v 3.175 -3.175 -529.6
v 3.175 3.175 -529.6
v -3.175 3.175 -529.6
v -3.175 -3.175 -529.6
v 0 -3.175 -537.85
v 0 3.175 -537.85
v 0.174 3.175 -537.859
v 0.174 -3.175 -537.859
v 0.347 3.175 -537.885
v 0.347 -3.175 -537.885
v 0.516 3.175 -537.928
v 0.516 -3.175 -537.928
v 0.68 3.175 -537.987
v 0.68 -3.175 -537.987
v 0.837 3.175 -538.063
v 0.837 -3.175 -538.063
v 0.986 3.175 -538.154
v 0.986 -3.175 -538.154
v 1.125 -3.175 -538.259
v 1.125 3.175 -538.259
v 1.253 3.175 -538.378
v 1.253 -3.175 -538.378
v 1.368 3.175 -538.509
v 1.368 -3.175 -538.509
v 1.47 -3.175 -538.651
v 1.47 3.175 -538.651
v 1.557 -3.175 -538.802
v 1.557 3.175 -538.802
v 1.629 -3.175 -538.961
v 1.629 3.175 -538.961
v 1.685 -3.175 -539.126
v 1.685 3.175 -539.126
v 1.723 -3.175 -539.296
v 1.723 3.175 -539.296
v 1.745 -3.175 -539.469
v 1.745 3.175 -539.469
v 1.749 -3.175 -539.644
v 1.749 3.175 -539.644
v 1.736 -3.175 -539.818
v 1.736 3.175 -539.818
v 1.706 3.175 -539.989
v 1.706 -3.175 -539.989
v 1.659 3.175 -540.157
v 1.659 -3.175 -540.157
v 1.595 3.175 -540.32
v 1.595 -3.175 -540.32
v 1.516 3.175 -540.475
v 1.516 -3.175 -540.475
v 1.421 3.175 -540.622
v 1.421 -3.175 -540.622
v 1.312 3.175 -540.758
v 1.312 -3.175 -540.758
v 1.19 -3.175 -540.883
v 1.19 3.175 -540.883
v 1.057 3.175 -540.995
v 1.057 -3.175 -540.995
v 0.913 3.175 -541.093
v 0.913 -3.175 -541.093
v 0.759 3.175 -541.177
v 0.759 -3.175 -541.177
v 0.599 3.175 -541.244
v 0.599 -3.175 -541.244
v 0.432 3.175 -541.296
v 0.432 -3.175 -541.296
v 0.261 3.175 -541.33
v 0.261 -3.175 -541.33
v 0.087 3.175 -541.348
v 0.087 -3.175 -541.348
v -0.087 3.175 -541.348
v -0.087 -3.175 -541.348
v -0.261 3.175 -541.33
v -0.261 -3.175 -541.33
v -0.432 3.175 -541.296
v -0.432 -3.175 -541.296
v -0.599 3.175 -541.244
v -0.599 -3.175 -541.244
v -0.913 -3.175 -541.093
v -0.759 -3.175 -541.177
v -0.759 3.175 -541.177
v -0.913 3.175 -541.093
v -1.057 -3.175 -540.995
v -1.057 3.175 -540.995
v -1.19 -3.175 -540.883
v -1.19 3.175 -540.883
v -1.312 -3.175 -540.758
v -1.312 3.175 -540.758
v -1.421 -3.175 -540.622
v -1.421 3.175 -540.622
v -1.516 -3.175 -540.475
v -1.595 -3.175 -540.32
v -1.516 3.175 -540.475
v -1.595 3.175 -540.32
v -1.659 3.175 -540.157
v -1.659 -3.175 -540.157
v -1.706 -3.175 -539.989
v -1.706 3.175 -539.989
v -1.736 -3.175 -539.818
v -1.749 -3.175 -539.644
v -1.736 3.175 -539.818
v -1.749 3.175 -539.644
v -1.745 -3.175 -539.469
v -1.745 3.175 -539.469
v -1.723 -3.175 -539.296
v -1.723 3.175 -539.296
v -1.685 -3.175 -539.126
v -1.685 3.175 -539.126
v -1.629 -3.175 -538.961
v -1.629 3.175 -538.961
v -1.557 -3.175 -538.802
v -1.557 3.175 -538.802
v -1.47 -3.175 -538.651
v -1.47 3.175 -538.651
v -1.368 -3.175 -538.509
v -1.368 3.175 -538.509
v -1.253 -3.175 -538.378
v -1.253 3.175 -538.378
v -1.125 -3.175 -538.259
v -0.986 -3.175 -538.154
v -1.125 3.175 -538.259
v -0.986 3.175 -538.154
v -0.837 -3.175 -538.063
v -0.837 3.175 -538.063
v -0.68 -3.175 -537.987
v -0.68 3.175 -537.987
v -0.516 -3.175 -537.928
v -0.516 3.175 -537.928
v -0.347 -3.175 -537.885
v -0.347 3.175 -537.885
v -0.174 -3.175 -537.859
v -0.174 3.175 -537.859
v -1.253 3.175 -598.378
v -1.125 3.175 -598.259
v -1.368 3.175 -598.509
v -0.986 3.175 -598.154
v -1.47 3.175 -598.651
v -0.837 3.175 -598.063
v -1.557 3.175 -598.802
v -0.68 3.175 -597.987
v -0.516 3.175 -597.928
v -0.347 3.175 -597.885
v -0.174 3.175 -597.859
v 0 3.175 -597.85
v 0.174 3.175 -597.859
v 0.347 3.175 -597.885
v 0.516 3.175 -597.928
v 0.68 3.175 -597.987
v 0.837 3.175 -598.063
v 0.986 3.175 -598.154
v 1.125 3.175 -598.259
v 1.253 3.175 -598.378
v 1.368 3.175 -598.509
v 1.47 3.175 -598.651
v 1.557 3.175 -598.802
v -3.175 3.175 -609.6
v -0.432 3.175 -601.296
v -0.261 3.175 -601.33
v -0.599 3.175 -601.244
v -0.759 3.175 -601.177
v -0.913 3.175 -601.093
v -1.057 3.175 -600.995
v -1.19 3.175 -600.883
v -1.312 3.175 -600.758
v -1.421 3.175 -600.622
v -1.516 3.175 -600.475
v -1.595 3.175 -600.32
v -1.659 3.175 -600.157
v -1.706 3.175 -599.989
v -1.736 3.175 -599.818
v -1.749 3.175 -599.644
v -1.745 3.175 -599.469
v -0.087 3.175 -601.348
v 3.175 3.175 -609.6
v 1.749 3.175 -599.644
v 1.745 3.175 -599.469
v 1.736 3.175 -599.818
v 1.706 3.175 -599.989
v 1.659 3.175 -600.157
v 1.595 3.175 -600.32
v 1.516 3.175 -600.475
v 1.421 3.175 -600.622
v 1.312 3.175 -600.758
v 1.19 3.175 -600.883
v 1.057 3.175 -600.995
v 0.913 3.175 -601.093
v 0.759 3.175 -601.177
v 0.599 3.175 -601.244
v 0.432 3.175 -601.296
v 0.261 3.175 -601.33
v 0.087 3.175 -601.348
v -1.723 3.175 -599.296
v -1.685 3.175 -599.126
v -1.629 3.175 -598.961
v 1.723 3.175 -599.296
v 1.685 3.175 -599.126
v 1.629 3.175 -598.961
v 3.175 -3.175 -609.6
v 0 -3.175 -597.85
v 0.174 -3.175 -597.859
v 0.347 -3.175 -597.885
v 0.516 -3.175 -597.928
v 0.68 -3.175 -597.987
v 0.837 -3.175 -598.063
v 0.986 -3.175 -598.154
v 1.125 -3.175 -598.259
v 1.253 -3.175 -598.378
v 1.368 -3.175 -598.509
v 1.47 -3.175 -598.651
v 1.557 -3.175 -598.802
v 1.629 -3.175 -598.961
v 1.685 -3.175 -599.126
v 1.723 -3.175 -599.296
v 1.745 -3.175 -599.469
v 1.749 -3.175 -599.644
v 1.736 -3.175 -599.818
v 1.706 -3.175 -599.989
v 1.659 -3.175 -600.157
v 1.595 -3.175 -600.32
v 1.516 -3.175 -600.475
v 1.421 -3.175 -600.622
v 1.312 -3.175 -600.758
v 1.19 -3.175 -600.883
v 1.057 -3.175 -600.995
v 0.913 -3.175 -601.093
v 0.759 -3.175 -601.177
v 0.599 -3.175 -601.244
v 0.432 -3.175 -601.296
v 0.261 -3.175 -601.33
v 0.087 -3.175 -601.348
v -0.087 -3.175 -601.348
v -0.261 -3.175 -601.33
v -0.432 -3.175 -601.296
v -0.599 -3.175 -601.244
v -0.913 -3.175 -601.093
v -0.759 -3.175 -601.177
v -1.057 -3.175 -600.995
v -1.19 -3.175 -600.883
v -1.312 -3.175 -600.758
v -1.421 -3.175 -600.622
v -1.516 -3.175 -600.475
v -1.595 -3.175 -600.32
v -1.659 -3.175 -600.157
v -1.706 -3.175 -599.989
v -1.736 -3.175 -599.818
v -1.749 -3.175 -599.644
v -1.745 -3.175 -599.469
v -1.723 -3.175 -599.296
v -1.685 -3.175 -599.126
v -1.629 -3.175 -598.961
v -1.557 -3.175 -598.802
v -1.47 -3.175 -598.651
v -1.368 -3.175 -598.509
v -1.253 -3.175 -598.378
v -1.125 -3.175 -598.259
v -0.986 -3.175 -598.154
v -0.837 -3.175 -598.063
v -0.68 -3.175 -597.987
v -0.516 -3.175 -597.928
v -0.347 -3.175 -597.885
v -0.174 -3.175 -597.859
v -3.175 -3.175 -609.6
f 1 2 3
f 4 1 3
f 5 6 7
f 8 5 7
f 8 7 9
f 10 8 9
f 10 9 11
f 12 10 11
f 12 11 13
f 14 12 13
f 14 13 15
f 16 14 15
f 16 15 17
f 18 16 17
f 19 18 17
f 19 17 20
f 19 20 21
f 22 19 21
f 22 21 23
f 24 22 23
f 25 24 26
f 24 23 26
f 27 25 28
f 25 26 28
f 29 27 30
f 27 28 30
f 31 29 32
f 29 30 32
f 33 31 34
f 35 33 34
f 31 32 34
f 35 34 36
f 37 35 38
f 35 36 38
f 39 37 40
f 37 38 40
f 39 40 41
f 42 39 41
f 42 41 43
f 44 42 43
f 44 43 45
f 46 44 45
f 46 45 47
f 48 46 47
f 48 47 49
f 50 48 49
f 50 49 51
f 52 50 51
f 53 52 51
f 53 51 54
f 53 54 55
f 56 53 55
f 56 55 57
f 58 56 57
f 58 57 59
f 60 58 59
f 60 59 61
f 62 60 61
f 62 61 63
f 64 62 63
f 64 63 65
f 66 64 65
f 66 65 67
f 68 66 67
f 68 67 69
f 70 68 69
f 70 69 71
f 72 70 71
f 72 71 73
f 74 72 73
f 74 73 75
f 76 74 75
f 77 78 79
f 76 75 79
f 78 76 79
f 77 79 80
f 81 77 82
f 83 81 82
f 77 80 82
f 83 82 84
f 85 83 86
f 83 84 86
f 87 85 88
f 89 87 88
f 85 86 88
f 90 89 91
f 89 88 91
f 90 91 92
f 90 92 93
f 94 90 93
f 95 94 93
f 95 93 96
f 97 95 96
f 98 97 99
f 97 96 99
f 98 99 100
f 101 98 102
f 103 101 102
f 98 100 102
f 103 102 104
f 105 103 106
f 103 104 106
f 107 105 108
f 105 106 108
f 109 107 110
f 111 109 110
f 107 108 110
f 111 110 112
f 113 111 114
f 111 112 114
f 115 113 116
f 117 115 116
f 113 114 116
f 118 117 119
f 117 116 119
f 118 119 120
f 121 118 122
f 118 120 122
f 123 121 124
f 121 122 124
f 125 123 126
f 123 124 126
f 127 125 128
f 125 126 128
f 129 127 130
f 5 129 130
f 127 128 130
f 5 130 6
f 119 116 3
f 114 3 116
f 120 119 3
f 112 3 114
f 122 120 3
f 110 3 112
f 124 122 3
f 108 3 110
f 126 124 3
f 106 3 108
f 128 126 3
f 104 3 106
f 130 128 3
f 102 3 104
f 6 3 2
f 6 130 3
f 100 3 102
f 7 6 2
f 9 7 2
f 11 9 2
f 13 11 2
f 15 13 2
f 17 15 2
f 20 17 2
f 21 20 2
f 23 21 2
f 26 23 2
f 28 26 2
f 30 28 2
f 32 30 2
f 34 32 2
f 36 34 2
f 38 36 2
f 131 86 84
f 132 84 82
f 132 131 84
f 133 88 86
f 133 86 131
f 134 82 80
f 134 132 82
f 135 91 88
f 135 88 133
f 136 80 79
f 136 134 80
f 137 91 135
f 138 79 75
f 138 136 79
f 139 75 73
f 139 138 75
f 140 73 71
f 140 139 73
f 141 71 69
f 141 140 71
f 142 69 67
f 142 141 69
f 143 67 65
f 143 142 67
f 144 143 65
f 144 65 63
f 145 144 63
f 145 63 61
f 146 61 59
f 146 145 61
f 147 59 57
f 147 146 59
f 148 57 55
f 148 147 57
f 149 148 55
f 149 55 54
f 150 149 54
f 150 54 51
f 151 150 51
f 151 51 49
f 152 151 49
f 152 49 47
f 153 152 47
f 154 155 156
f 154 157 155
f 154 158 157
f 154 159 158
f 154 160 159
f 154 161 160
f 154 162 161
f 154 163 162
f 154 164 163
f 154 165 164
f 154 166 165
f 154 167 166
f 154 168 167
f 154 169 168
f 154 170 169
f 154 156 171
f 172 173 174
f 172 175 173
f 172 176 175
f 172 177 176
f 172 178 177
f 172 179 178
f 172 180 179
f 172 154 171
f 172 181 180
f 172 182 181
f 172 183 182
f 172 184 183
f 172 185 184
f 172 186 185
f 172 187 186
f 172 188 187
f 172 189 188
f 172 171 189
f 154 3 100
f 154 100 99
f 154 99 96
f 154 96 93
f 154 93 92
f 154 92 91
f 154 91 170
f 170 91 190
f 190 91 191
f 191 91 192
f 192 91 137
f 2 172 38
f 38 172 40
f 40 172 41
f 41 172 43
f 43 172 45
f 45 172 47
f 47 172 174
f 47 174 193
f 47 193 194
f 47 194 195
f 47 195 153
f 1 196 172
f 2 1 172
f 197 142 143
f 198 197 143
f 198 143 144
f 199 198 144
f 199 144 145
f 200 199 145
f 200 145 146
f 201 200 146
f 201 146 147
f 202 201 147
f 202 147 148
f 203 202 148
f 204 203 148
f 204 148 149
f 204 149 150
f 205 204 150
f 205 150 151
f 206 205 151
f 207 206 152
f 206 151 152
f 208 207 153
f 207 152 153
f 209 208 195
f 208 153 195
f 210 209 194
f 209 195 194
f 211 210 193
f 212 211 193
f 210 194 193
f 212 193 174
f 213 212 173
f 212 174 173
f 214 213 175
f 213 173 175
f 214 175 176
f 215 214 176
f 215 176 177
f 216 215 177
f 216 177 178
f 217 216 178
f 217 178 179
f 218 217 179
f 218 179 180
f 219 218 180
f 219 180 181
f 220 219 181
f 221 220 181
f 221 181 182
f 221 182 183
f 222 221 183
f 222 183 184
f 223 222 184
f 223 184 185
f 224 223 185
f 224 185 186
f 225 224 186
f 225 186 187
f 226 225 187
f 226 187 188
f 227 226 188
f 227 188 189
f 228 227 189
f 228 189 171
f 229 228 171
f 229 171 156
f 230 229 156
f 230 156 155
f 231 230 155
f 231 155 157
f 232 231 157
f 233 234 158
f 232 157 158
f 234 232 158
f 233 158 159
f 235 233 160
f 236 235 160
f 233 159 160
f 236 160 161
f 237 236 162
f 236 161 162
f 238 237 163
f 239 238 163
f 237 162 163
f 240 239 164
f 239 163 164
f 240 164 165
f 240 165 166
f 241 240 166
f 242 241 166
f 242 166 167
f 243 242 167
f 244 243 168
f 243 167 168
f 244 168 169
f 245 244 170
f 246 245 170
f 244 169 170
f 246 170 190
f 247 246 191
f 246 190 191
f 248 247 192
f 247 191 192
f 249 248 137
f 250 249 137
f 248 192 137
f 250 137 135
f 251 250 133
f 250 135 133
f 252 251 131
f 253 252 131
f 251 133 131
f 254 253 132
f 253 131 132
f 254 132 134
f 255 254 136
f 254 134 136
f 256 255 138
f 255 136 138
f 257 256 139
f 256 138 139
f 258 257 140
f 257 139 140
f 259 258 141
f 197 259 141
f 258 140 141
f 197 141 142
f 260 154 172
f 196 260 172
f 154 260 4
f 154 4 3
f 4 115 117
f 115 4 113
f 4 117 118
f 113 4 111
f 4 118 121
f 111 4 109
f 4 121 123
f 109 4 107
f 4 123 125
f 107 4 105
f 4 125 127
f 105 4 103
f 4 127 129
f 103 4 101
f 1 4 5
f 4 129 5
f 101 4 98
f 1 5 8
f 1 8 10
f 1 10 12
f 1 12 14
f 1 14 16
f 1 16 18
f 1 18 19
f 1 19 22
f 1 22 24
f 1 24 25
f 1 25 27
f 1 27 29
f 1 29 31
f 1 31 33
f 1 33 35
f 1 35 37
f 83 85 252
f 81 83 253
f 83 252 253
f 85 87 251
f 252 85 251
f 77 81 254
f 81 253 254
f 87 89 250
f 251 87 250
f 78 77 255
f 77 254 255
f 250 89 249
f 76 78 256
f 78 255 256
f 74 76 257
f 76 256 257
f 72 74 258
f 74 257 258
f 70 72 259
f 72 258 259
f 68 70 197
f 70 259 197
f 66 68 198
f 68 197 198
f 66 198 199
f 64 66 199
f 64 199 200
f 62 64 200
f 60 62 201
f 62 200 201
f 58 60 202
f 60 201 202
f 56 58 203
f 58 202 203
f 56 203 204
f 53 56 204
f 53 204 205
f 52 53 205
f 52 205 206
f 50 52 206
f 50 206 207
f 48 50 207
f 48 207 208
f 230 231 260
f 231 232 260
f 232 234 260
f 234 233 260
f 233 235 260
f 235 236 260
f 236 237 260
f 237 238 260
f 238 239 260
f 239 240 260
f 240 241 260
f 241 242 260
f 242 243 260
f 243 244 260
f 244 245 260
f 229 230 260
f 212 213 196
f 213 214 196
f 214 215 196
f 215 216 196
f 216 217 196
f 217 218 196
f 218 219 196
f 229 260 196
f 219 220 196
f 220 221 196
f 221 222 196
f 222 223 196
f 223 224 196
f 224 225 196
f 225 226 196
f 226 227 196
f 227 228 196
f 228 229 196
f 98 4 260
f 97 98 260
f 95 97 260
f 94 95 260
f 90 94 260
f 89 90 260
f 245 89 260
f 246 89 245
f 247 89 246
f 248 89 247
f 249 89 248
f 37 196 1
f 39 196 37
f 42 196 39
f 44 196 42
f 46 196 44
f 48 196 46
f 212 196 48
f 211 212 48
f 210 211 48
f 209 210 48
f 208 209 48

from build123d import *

# Parameters (mm, degrees)
BOSS_EXTRUDE1_DEPTH      = 609.6
BOSS_EXTRUDE1_DEPTH_BACK = 609.6
SKETCH3_W                = 6.35
SKETCH3_H                = 6.35
SKETCH4_W                = 7.35
SKETCH4_H                = 7.35
CUT_EXTRUDE1_DEPTH       = 1140.208848829
SKETCH5_R                = 1.75
CUT_EXTRUDE2_DEPTH       = 610.641339744


with BuildPart() as part:
    # Sketch3 → Boss-Extrude1 (new, two sides: drawn at the far end of the back side and taken through both)
    with BuildSketch(Plane.XY.offset(-BOSS_EXTRUDE1_DEPTH_BACK)):
        Rectangle(SKETCH3_W, SKETCH3_H)
    extrude(amount=BOSS_EXTRUDE1_DEPTH + BOSS_EXTRUDE1_DEPTH_BACK)

    # Sketch4 → Cut-Extrude1 (cut, through all)
    with BuildSketch(Plane(origin=(0, 0, -529.6), x_dir=(-1, 0, 0), z_dir=(0, 0, -1))):
        Rectangle(SKETCH4_W, SKETCH4_H)
    extrude(amount=-CUT_EXTRUDE1_DEPTH, mode=Mode.SUBTRACT)

    # Sketch5 → Cut-Extrude2 (cut, through all)
    with BuildSketch(Plane(origin=(0, 3.175, 0), x_dir=(1, 0, 0), z_dir=(0, 1, 0))):
        with Locations(Location((0, 599.6, 0), (0, 0, 270))):
            Circle(SKETCH5_R)
        with Locations(Location((0, 539.6, 0), (0, 0, 270))):
            Circle(SKETCH5_R)
    extrude(amount=-CUT_EXTRUDE2_DEPTH, mode=Mode.SUBTRACT)


solid = part.part
